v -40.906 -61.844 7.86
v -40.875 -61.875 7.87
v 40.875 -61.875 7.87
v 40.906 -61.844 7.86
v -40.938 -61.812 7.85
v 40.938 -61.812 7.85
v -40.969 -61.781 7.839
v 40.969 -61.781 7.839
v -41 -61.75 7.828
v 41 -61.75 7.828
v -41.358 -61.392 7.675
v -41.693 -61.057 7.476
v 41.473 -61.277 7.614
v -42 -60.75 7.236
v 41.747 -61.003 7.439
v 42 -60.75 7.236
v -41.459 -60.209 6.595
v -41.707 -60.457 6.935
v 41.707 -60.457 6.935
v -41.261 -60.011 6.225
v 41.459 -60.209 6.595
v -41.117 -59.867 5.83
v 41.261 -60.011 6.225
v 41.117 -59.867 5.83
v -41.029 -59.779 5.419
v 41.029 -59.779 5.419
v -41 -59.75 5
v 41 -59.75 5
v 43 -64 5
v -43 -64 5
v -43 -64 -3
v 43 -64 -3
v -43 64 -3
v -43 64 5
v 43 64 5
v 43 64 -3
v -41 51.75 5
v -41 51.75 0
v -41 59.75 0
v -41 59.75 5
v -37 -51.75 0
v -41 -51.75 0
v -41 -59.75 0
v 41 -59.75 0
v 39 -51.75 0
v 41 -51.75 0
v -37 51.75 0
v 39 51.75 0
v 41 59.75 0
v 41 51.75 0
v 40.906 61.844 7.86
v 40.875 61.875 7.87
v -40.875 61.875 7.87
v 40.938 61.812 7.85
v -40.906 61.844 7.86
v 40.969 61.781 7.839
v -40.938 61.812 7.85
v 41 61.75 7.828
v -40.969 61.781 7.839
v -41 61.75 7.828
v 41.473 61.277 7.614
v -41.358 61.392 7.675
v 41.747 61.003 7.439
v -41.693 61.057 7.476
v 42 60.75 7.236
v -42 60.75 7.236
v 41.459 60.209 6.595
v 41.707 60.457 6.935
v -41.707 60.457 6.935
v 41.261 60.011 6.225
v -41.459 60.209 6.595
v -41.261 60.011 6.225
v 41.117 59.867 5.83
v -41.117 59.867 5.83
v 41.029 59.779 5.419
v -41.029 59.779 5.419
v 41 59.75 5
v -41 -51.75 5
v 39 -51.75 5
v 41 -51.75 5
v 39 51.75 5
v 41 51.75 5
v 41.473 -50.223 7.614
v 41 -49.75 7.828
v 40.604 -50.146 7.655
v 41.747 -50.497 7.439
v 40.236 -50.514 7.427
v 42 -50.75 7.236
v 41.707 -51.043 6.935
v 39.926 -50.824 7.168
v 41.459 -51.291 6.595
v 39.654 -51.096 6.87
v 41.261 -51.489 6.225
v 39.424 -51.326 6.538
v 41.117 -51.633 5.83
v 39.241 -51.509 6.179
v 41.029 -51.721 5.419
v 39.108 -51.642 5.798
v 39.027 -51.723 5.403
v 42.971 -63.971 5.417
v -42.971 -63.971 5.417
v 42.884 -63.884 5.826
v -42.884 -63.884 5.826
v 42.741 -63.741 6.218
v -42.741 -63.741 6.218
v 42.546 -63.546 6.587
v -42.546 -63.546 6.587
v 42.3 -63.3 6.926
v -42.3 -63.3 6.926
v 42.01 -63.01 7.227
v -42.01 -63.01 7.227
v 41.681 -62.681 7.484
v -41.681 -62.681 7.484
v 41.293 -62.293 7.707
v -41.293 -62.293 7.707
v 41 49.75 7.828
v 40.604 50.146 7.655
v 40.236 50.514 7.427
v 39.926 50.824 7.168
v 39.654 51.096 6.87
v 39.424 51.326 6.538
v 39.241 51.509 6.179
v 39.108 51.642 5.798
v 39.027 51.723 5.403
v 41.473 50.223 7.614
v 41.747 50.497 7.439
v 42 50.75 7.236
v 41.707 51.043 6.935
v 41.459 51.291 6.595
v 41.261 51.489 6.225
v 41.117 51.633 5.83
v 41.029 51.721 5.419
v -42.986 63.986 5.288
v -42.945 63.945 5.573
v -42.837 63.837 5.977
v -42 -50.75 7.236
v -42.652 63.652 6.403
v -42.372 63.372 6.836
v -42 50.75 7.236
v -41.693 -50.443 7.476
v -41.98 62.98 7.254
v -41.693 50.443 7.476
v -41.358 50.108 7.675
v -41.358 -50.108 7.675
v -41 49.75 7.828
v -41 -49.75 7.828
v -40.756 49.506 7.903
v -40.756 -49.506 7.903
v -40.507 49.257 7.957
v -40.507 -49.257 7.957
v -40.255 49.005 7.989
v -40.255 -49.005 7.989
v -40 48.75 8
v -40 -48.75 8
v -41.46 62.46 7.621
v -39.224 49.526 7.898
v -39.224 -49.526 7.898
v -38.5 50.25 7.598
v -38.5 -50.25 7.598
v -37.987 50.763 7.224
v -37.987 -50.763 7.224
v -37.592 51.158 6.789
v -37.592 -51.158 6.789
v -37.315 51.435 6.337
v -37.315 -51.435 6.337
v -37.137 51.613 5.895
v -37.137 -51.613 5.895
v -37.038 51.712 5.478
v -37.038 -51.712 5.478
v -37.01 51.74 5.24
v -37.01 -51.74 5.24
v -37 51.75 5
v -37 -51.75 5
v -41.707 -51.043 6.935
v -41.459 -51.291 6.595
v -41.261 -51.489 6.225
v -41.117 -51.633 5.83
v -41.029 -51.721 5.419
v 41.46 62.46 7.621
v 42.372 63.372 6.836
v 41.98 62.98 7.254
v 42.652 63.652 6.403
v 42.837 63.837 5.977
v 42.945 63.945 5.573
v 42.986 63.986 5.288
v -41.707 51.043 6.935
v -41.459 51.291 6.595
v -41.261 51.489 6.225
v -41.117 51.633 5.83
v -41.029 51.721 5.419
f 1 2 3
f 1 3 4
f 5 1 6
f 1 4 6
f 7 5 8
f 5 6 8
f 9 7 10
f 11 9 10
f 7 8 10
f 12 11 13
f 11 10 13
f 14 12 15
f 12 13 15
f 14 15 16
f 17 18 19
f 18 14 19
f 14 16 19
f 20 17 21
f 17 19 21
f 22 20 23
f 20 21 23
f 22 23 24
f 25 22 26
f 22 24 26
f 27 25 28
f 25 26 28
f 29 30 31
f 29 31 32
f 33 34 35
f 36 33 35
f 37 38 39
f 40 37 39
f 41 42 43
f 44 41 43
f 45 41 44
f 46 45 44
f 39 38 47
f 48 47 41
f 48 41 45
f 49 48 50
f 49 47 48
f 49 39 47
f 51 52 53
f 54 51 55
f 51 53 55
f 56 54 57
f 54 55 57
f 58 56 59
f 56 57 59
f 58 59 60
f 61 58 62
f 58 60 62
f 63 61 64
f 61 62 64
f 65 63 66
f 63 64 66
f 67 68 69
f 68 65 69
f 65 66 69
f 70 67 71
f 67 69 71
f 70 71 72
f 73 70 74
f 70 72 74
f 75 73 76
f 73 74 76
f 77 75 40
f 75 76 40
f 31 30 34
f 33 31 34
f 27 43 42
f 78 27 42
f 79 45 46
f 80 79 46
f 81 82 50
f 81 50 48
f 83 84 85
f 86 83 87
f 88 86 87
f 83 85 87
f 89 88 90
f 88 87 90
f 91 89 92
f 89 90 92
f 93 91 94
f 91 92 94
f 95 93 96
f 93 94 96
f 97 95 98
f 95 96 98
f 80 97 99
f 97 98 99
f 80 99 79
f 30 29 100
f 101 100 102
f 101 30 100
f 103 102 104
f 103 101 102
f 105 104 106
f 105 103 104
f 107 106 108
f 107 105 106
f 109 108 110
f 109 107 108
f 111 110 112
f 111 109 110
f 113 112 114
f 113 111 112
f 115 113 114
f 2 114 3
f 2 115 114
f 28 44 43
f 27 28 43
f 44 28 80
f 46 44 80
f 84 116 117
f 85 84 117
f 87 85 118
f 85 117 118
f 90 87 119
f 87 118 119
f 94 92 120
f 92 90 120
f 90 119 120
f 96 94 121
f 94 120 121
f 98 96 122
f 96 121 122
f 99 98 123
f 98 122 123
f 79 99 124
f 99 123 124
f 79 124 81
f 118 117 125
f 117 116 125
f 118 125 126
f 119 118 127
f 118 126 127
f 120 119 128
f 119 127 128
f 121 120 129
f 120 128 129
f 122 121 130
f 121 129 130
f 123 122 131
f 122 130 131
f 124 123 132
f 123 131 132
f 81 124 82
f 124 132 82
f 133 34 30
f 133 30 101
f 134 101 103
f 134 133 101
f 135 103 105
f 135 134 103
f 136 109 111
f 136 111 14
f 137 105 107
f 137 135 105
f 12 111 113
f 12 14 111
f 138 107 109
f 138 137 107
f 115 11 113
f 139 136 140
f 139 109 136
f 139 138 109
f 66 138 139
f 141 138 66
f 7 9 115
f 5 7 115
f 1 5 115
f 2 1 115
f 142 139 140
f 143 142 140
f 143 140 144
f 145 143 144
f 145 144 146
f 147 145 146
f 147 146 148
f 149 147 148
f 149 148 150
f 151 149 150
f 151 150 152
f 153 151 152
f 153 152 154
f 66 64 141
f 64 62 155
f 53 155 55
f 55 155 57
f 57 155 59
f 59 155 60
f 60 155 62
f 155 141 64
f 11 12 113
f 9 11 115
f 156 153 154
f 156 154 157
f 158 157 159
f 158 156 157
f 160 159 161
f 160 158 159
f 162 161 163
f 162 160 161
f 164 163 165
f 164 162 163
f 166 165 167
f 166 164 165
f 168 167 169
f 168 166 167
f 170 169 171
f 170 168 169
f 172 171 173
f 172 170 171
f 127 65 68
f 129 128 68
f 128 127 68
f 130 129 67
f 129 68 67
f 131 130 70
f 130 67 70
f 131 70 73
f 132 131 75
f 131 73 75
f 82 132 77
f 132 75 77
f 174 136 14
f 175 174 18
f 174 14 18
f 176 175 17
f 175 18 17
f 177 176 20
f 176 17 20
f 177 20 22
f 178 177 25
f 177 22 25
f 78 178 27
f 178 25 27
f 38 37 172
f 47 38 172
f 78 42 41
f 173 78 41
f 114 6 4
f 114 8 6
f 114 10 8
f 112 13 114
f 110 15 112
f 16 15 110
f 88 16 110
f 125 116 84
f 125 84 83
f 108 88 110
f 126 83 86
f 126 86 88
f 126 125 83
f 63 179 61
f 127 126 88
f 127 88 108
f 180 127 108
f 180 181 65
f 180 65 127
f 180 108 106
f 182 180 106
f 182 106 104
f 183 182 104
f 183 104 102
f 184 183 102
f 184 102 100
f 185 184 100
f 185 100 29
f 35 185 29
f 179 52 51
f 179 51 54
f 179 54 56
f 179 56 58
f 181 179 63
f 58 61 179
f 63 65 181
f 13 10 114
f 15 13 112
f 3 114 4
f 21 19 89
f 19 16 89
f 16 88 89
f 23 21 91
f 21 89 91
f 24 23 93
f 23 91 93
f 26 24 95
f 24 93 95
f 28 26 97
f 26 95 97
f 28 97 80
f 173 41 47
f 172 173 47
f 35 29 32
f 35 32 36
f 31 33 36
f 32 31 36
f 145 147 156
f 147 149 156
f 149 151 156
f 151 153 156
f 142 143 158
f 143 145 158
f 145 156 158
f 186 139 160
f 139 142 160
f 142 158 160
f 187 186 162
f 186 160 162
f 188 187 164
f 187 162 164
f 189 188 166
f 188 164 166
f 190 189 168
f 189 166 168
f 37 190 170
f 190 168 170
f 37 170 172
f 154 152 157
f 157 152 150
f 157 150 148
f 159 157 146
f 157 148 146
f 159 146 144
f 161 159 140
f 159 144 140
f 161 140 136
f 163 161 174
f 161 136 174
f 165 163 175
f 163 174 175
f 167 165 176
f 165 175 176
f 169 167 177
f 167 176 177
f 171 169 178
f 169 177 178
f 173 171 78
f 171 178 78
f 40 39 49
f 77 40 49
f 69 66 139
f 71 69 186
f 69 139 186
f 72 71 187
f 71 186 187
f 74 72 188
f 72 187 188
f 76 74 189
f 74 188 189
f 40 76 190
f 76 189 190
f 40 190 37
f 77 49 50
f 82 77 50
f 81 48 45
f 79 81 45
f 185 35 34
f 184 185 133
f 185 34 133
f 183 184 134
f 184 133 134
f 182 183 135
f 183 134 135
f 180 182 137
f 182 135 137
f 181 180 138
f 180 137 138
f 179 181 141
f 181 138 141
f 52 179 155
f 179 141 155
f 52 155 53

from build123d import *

# Parameters (mm, degrees)
F1_W          = 86
F1_H          = 128
F2_DEPTH      = 8
F0_W          = 86
F0_H          = 128
F3_DEPTH      = 3
F4_T1_DEPTH   = 118.5
F4_T3_DEPTH   = 101
F4_T5_DEPTH   = 143
F4_T7_DEPTH   = 8
F4_T9_DEPTH   = 82
F4_T11_DEPTH  = 9.5
F4_T13_DEPTH  = 8
F4_T15_DEPTH  = 11.5
F4_T21_DEPTH  = 15.5
F4_T26_DEPTH  = 11.5
F4_T34_DEPTH  = 15.5
F4_T40_DEPTH  = 89.5
F4_T48_DEPTH  = 89.5
F4_T53_DEPTH  = 15.5
F4_T62_DEPTH  = 15.5
F4_T67_DEPTH  = 9.5
F4_T75_DEPTH  = 9.5
F4_T80_DEPTH  = 15.5
F4_T88_DEPTH  = 15.5
F4_T94_DEPTH  = 89.5
F4_T102_DEPTH = 89.5
F4_T107_DEPTH = 15.5
F4_T116_DEPTH = 15.5
F4_T121_DEPTH = 11.5


# Not quite as in the source:
# - a fillet or chamfer that OpenCascade refuses, or shapes differently, is made with other operations: its cross-section is extruded or revolved along the edge and cut away or added


with BuildPart() as f2:
    # F1 (on face) → F2 (new body)
    with BuildSketch(Plane.XY):
        Rectangle(F1_W, F1_H)
        Polygon((-41, 51.75), (-41, 59.75), (41, 59.75), (41, 51.75), (39, 51.75), (39, -51.75), (41, -51.75), (41, -59.75), (-41, -59.75), (-41, -51.75), (-37, -51.75), (-37, 51.75), align=None, mode=Mode.SUBTRACT)
    extrude(amount=F2_DEPTH)

    # F0 (on Top) → F3 (join)
    with BuildSketch(Plane.XY):
        Rectangle(F0_W, F0_H)
    extrude(amount=-F3_DEPTH)

    # F4: fillet of radius 3 on 16 edges, made by hand

    # F4_s2 → F4_t1 (cut)
    with BuildSketch(Plane.XZ.offset(-59.25)):
        with BuildLine():
            ThreePointArc((-40, 8), (-37.8786796564, 7.1213203436), (-37, 5))
            Line((-37, 5), (-37, 8))
            Line((-37, 8), (-40, 8))
        make_face()
        with BuildLine():
            ThreePointArc((42, 8), (39.8786796564, 7.1213203436), (39, 5))
            Line((39, 5), (39, 8))
            Line((39, 8), (42, 8))
        make_face()
    extrude(amount=F4_T1_DEPTH, mode=Mode.SUBTRACT)

    # F4_s4 → F4_t3 (cut)
    with BuildSketch(Plane.YZ.offset(-50.5)):
        with BuildLine():
            ThreePointArc((64, 5), (63.1213203436, 7.1213203436), (61, 8))
            Line((61, 8), (64, 8))
            Line((64, 8), (64, 5))
        make_face()
        with BuildLine():
            ThreePointArc((-64, 5), (-63.1213203436, 7.1213203436), (-61, 8))
            Line((-61, 8), (-64, 8))
            Line((-64, 8), (-64, 5))
        make_face()
    extrude(amount=F4_T3_DEPTH, mode=Mode.SUBTRACT)

    # F4_s6 → F4_t5 (cut)
    with BuildSketch(Plane.XZ.offset(-71.5)):
        with BuildLine():
            ThreePointArc((-43, 5), (-42.1213203436, 7.1213203436), (-40, 8))
            Line((-40, 8), (-43, 8))
            Line((-43, 8), (-43, 5))
        make_face()
        with BuildLine():
            ThreePointArc((40, 8), (42.1213203436, 7.1213203436), (43, 5))
            Line((43, 5), (43, 8))
            Line((43, 8), (40, 8))
        make_face()
    extrude(amount=F4_T5_DEPTH, mode=Mode.SUBTRACT)

    # F4_s8 → F4_t7 (cut)
    with BuildSketch(Plane.XZ.offset(-59.75)):
        with BuildLine():
            ThreePointArc((-44, 8), (-41.8786796564, 7.1213203436), (-41, 5))
            Line((-41, 5), (-41, 8))
            Line((-41, 8), (-44, 8))
        make_face()
        with BuildLine():
            ThreePointArc((44, 8), (41.8786796564, 7.1213203436), (41, 5))
            Line((41, 5), (41, 8))
            Line((41, 8), (44, 8))
        make_face()
    extrude(amount=F4_T7_DEPTH, mode=Mode.SUBTRACT)

    # F4_s10 → F4_t9 (cut)
    with BuildSketch(Plane.YZ.offset(-41)):
        with BuildLine():
            ThreePointArc((62.75, 8), (60.6286796564, 7.1213203436), (59.75, 5))
            Line((59.75, 5), (59.75, 8))
            Line((59.75, 8), (62.75, 8))
        make_face()
        with BuildLine():
            ThreePointArc((-62.75, 8), (-60.6286796564, 7.1213203436), (-59.75, 5))
            Line((-59.75, 5), (-59.75, 8))
            Line((-59.75, 8), (-62.75, 8))
        make_face()
    extrude(amount=F4_T9_DEPTH, mode=Mode.SUBTRACT)

    # F4_s12 → F4_t11 (cut)
    with BuildSketch(Plane.YZ.offset(31.5)):
        with BuildLine():
            ThreePointArc((48.75, 8), (50.8713203436, 7.1213203436), (51.75, 5))
            Line((51.75, 5), (51.75, 8))
            Line((51.75, 8), (48.75, 8))
        make_face()
        with BuildLine():
            ThreePointArc((-48.75, 8), (-50.8713203436, 7.1213203436), (-51.75, 5))
            Line((-51.75, 5), (-51.75, 8))
            Line((-51.75, 8), (-48.75, 8))
        make_face()
    extrude(amount=F4_T11_DEPTH, mode=Mode.SUBTRACT)

    # F4_s14 → F4_t13 (cut)
    with BuildSketch(Plane.XZ.offset(51.75)):
        with BuildLine():
            ThreePointArc((44, 8), (41.8786796564, 7.1213203436), (41, 5))
            Line((41, 5), (41, 8))
            Line((41, 8), (44, 8))
        make_face()
        with BuildLine():
            ThreePointArc((-44, 8), (-41.8786796564, 7.1213203436), (-41, 5))
            Line((-41, 5), (-41, 8))
            Line((-41, 8), (-44, 8))
        make_face()
    extrude(amount=F4_T13_DEPTH, mode=Mode.SUBTRACT)

    # F4_s16 → F4_t15 (cut)
    with BuildSketch(Plane.YZ.offset(-41)):
        with BuildLine():
            ThreePointArc((-48.75, 8), (-50.8713203436, 7.1213203436), (-51.75, 5))
            Line((-51.75, 5), (-51.75, 8))
            Line((-51.75, 8), (-48.75, 8))
        make_face()
        with BuildLine():
            ThreePointArc((48.75, 8), (50.8713203436, 7.1213203436), (51.75, 5))
            Line((51.75, 5), (51.75, 8))
            Line((51.75, 8), (48.75, 8))
        make_face()
    extrude(amount=F4_T15_DEPTH, mode=Mode.SUBTRACT)


with BuildPart() as f4_tool19:
    # F4_s20 → F4_t21 (new body)
    with BuildSketch(Plane.XZ.offset(-44.25)):
        with BuildLine():
            ThreePointArc((-44, 8), (-41.8786796564, 7.1213203436), (-41, 5))
            Line((-41, 5), (-41, 8))
            Line((-41, 8), (-44, 8))
        make_face()
    extrude(amount=-F4_T21_DEPTH)

    split(bisect_by=Plane.YZ.offset(-43), keep=Keep.TOP)

    split(bisect_by=Plane.XZ.offset(-51.75), keep=Keep.TOP)


with BuildPart() as f4_tool24:
    # F4_s25 → F4_t26 (new body)
    with BuildSketch(Plane.YZ.offset(-37)):
        with BuildLine():
            ThreePointArc((48.75, 8), (50.8713203436, 7.1213203436), (51.75, 5))
            Line((51.75, 5), (51.75, 8))
            Line((51.75, 8), (48.75, 8))
        make_face()
    extrude(amount=-F4_T26_DEPTH)

    split(bisect_by=Plane.YZ.offset(-43), keep=Keep.TOP)

    split(bisect_by=Plane.YZ.offset(-41), keep=Keep.BOTTOM)


with BuildPart() as f4_tool19_1:
    add(f4_tool19.part)

    # F4_t29: intersect F4_tool24
    add(f4_tool24.part, mode=Mode.INTERSECT)


with BuildPart() as f2_1:
    add(f2.part)

    # F4_t17: cut F4_tool19
    add(f4_tool19_1.part, mode=Mode.SUBTRACT)


with BuildPart() as f4_tool32:
    # F4_s33 → F4_t34 (new body)
    with BuildSketch(Plane.XZ.offset(-51.75)):
        with BuildLine():
            ThreePointArc((-44, 8), (-41.8786796564, 7.1213203436), (-41, 5))
            Line((-41, 5), (-41, 8))
            Line((-41, 8), (-44, 8))
        make_face()
    extrude(amount=-F4_T34_DEPTH)

    split(bisect_by=Plane.XZ.offset(-64), keep=Keep.TOP)

    split(bisect_by=Plane.YZ.offset(-43), keep=Keep.TOP)

    split(bisect_by=Plane.XZ.offset(-59.75), keep=Keep.BOTTOM)


with BuildPart() as f4_tool38:
    # F4_s39 → F4_t40 (new body)
    with BuildSketch(Plane.YZ.offset(-48.5)):
        with BuildLine():
            ThreePointArc((62.75, 8), (60.6286796564, 7.1213203436), (59.75, 5))
            Line((59.75, 5), (59.75, 8))
            Line((59.75, 8), (62.75, 8))
        make_face()
    extrude(amount=F4_T40_DEPTH)

    split(bisect_by=Plane.YZ.offset(-43), keep=Keep.TOP)

    split(bisect_by=Plane.YZ.offset(-41), keep=Keep.BOTTOM)


with BuildPart() as f4_tool32_1:
    add(f4_tool32.part)

    # F4_t43: intersect F4_tool38
    add(f4_tool38.part, mode=Mode.INTERSECT)


with BuildPart() as f2_2:
    add(f2_1.part)

    # F4_t30: cut F4_tool32
    add(f4_tool32_1.part, mode=Mode.SUBTRACT)


with BuildPart() as f4_tool46:
    # F4_s47 → F4_t48 (new body)
    with BuildSketch(Plane.YZ.offset(-41)):
        with BuildLine():
            ThreePointArc((62.75, 8), (60.6286796564, 7.1213203436), (59.75, 5))
            Line((59.75, 5), (59.75, 8))
            Line((59.75, 8), (62.75, 8))
        make_face()
    extrude(amount=F4_T48_DEPTH)

    split(bisect_by=Plane.YZ.offset(41), keep=Keep.TOP)

    split(bisect_by=Plane.YZ.offset(43), keep=Keep.BOTTOM)


with BuildPart() as f4_tool51:
    # F4_s52 → F4_t53 (new body)
    with BuildSketch(Plane.XZ.offset(-67.25)):
        with BuildLine():
            ThreePointArc((44, 8), (41.8786796564, 7.1213203436), (41, 5))
            Line((41, 5), (41, 8))
            Line((41, 8), (44, 8))
        make_face()
    extrude(amount=F4_T53_DEPTH)

    split(bisect_by=Plane.XZ.offset(-64), keep=Keep.TOP)

    split(bisect_by=Plane.XZ.offset(-59.75), keep=Keep.BOTTOM)

    split(bisect_by=Plane.YZ.offset(43), keep=Keep.BOTTOM)


with BuildPart() as f4_tool46_1:
    add(f4_tool46.part)

    # F4_t57: intersect F4_tool51
    add(f4_tool51.part, mode=Mode.INTERSECT)


with BuildPart() as f2_3:
    add(f2_2.part)

    # F4_t44: cut F4_tool46
    add(f4_tool46_1.part, mode=Mode.SUBTRACT)


with BuildPart() as f4_tool60:
    # F4_s61 → F4_t62 (new body)
    with BuildSketch(Plane.XZ.offset(-59.75)):
        with BuildLine():
            ThreePointArc((44, 8), (41.8786796564, 7.1213203436), (41, 5))
            Line((41, 5), (41, 8))
            Line((41, 8), (44, 8))
        make_face()
    extrude(amount=F4_T62_DEPTH)

    split(bisect_by=Plane.XZ.offset(-51.75), keep=Keep.TOP)

    split(bisect_by=Plane.YZ.offset(43), keep=Keep.BOTTOM)


with BuildPart() as f4_tool65:
    # F4_s66 → F4_t67 (new body)
    with BuildSketch(Plane.YZ.offset(48.5)):
        with BuildLine():
            ThreePointArc((48.75, 8), (50.8713203436, 7.1213203436), (51.75, 5))
            Line((51.75, 5), (51.75, 8))
            Line((51.75, 8), (48.75, 8))
        make_face()
    extrude(amount=-F4_T67_DEPTH)

    split(bisect_by=Plane.YZ.offset(41), keep=Keep.TOP)

    split(bisect_by=Plane.YZ.offset(43), keep=Keep.BOTTOM)


with BuildPart() as f4_tool60_1:
    add(f4_tool60.part)

    # F4_t70: intersect F4_tool65
    add(f4_tool65.part, mode=Mode.INTERSECT)


with BuildPart() as f2_4:
    add(f2_3.part)

    # F4_t58: cut F4_tool60
    add(f4_tool60_1.part, mode=Mode.SUBTRACT)


with BuildPart() as f4_tool73:
    # F4_s74 → F4_t75 (new body)
    with BuildSketch(Plane.YZ.offset(39)):
        with BuildLine():
            ThreePointArc((-48.75, 8), (-50.8713203436, 7.1213203436), (-51.75, 5))
            Line((-51.75, 5), (-51.75, 8))
            Line((-51.75, 8), (-48.75, 8))
        make_face()
    extrude(amount=F4_T75_DEPTH)

    split(bisect_by=Plane.YZ.offset(41), keep=Keep.TOP)

    split(bisect_by=Plane.YZ.offset(43), keep=Keep.BOTTOM)


with BuildPart() as f4_tool78:
    # F4_s79 → F4_t80 (new body)
    with BuildSketch(Plane.XZ.offset(44.25)):
        with BuildLine():
            ThreePointArc((44, 8), (41.8786796564, 7.1213203436), (41, 5))
            Line((41, 5), (41, 8))
            Line((41, 8), (44, 8))
        make_face()
    extrude(amount=F4_T80_DEPTH)

    split(bisect_by=Plane.XZ.offset(51.75), keep=Keep.BOTTOM)

    split(bisect_by=Plane.YZ.offset(43), keep=Keep.BOTTOM)


with BuildPart() as f4_tool73_1:
    add(f4_tool73.part)

    # F4_t83: intersect F4_tool78
    add(f4_tool78.part, mode=Mode.INTERSECT)


with BuildPart() as f2_5:
    add(f2_4.part)

    # F4_t71: cut F4_tool73
    add(f4_tool73_1.part, mode=Mode.SUBTRACT)


with BuildPart() as f4_tool86:
    # F4_s87 → F4_t88 (new body)
    with BuildSketch(Plane.XZ.offset(51.75)):
        with BuildLine():
            ThreePointArc((44, 8), (41.8786796564, 7.1213203436), (41, 5))
            Line((41, 5), (41, 8))
            Line((41, 8), (44, 8))
        make_face()
    extrude(amount=F4_T88_DEPTH)

    split(bisect_by=Plane.XZ.offset(64), keep=Keep.BOTTOM)

    split(bisect_by=Plane.XZ.offset(59.75), keep=Keep.TOP)

    split(bisect_by=Plane.YZ.offset(43), keep=Keep.BOTTOM)


with BuildPart() as f4_tool92:
    # F4_s93 → F4_t94 (new body)
    with BuildSketch(Plane.YZ.offset(48.5)):
        with BuildLine():
            ThreePointArc((-62.75, 8), (-60.6286796564, 7.1213203436), (-59.75, 5))
            Line((-59.75, 5), (-59.75, 8))
            Line((-59.75, 8), (-62.75, 8))
        make_face()
    extrude(amount=-F4_T94_DEPTH)

    split(bisect_by=Plane.YZ.offset(41), keep=Keep.TOP)

    split(bisect_by=Plane.YZ.offset(43), keep=Keep.BOTTOM)


with BuildPart() as f4_tool86_1:
    add(f4_tool86.part)

    # F4_t97: intersect F4_tool92
    add(f4_tool92.part, mode=Mode.INTERSECT)


with BuildPart() as f2_6:
    add(f2_5.part)

    # F4_t84: cut F4_tool86
    add(f4_tool86_1.part, mode=Mode.SUBTRACT)


with BuildPart() as f4_tool100:
    # F4_s101 → F4_t102 (new body)
    with BuildSketch(Plane.YZ.offset(41)):
        with BuildLine():
            ThreePointArc((-62.75, 8), (-60.6286796564, 7.1213203436), (-59.75, 5))
            Line((-59.75, 5), (-59.75, 8))
            Line((-59.75, 8), (-62.75, 8))
        make_face()
    extrude(amount=-F4_T102_DEPTH)

    split(bisect_by=Plane.YZ.offset(-43), keep=Keep.TOP)

    split(bisect_by=Plane.YZ.offset(-41), keep=Keep.BOTTOM)


with BuildPart() as f4_tool105:
    # F4_s106 → F4_t107 (new body)
    with BuildSketch(Plane.XZ.offset(67.25)):
        with BuildLine():
            ThreePointArc((-44, 8), (-41.8786796564, 7.1213203436), (-41, 5))
            Line((-41, 5), (-41, 8))
            Line((-41, 8), (-44, 8))
        make_face()
    extrude(amount=-F4_T107_DEPTH)

    split(bisect_by=Plane.XZ.offset(64), keep=Keep.BOTTOM)

    split(bisect_by=Plane.YZ.offset(-43), keep=Keep.TOP)

    split(bisect_by=Plane.XZ.offset(59.75), keep=Keep.TOP)


with BuildPart() as f4_tool100_1:
    add(f4_tool100.part)

    # F4_t111: intersect F4_tool105
    add(f4_tool105.part, mode=Mode.INTERSECT)


with BuildPart() as f2_7:
    add(f2_6.part)

    # F4_t98: cut F4_tool100
    add(f4_tool100_1.part, mode=Mode.SUBTRACT)


with BuildPart() as f4_tool114:
    # F4_s115 → F4_t116 (new body)
    with BuildSketch(Plane.XZ.offset(59.75)):
        with BuildLine():
            ThreePointArc((-44, 8), (-41.8786796564, 7.1213203436), (-41, 5))
            Line((-41, 5), (-41, 8))
            Line((-41, 8), (-44, 8))
        make_face()
    extrude(amount=-F4_T116_DEPTH)

    split(bisect_by=Plane.YZ.offset(-43), keep=Keep.TOP)

    split(bisect_by=Plane.XZ.offset(51.75), keep=Keep.BOTTOM)


with BuildPart() as f4_tool119:
    # F4_s120 → F4_t121 (new body)
    with BuildSketch(Plane.YZ.offset(-48.5)):
        with BuildLine():
            ThreePointArc((-48.75, 8), (-50.8713203436, 7.1213203436), (-51.75, 5))
            Line((-51.75, 5), (-51.75, 8))
            Line((-51.75, 8), (-48.75, 8))
        make_face()
    extrude(amount=F4_T121_DEPTH)

    split(bisect_by=Plane.YZ.offset(-43), keep=Keep.TOP)

    split(bisect_by=Plane.YZ.offset(-41), keep=Keep.BOTTOM)


with BuildPart() as f4_tool114_1:
    add(f4_tool114.part)

    # F4_t124: intersect F4_tool119
    add(f4_tool119.part, mode=Mode.INTERSECT)


with BuildPart() as f2_8:
    add(f2_7.part)

    # F4_t112: cut F4_tool114
    add(f4_tool114_1.part, mode=Mode.SUBTRACT)


solid = f2_8.part
